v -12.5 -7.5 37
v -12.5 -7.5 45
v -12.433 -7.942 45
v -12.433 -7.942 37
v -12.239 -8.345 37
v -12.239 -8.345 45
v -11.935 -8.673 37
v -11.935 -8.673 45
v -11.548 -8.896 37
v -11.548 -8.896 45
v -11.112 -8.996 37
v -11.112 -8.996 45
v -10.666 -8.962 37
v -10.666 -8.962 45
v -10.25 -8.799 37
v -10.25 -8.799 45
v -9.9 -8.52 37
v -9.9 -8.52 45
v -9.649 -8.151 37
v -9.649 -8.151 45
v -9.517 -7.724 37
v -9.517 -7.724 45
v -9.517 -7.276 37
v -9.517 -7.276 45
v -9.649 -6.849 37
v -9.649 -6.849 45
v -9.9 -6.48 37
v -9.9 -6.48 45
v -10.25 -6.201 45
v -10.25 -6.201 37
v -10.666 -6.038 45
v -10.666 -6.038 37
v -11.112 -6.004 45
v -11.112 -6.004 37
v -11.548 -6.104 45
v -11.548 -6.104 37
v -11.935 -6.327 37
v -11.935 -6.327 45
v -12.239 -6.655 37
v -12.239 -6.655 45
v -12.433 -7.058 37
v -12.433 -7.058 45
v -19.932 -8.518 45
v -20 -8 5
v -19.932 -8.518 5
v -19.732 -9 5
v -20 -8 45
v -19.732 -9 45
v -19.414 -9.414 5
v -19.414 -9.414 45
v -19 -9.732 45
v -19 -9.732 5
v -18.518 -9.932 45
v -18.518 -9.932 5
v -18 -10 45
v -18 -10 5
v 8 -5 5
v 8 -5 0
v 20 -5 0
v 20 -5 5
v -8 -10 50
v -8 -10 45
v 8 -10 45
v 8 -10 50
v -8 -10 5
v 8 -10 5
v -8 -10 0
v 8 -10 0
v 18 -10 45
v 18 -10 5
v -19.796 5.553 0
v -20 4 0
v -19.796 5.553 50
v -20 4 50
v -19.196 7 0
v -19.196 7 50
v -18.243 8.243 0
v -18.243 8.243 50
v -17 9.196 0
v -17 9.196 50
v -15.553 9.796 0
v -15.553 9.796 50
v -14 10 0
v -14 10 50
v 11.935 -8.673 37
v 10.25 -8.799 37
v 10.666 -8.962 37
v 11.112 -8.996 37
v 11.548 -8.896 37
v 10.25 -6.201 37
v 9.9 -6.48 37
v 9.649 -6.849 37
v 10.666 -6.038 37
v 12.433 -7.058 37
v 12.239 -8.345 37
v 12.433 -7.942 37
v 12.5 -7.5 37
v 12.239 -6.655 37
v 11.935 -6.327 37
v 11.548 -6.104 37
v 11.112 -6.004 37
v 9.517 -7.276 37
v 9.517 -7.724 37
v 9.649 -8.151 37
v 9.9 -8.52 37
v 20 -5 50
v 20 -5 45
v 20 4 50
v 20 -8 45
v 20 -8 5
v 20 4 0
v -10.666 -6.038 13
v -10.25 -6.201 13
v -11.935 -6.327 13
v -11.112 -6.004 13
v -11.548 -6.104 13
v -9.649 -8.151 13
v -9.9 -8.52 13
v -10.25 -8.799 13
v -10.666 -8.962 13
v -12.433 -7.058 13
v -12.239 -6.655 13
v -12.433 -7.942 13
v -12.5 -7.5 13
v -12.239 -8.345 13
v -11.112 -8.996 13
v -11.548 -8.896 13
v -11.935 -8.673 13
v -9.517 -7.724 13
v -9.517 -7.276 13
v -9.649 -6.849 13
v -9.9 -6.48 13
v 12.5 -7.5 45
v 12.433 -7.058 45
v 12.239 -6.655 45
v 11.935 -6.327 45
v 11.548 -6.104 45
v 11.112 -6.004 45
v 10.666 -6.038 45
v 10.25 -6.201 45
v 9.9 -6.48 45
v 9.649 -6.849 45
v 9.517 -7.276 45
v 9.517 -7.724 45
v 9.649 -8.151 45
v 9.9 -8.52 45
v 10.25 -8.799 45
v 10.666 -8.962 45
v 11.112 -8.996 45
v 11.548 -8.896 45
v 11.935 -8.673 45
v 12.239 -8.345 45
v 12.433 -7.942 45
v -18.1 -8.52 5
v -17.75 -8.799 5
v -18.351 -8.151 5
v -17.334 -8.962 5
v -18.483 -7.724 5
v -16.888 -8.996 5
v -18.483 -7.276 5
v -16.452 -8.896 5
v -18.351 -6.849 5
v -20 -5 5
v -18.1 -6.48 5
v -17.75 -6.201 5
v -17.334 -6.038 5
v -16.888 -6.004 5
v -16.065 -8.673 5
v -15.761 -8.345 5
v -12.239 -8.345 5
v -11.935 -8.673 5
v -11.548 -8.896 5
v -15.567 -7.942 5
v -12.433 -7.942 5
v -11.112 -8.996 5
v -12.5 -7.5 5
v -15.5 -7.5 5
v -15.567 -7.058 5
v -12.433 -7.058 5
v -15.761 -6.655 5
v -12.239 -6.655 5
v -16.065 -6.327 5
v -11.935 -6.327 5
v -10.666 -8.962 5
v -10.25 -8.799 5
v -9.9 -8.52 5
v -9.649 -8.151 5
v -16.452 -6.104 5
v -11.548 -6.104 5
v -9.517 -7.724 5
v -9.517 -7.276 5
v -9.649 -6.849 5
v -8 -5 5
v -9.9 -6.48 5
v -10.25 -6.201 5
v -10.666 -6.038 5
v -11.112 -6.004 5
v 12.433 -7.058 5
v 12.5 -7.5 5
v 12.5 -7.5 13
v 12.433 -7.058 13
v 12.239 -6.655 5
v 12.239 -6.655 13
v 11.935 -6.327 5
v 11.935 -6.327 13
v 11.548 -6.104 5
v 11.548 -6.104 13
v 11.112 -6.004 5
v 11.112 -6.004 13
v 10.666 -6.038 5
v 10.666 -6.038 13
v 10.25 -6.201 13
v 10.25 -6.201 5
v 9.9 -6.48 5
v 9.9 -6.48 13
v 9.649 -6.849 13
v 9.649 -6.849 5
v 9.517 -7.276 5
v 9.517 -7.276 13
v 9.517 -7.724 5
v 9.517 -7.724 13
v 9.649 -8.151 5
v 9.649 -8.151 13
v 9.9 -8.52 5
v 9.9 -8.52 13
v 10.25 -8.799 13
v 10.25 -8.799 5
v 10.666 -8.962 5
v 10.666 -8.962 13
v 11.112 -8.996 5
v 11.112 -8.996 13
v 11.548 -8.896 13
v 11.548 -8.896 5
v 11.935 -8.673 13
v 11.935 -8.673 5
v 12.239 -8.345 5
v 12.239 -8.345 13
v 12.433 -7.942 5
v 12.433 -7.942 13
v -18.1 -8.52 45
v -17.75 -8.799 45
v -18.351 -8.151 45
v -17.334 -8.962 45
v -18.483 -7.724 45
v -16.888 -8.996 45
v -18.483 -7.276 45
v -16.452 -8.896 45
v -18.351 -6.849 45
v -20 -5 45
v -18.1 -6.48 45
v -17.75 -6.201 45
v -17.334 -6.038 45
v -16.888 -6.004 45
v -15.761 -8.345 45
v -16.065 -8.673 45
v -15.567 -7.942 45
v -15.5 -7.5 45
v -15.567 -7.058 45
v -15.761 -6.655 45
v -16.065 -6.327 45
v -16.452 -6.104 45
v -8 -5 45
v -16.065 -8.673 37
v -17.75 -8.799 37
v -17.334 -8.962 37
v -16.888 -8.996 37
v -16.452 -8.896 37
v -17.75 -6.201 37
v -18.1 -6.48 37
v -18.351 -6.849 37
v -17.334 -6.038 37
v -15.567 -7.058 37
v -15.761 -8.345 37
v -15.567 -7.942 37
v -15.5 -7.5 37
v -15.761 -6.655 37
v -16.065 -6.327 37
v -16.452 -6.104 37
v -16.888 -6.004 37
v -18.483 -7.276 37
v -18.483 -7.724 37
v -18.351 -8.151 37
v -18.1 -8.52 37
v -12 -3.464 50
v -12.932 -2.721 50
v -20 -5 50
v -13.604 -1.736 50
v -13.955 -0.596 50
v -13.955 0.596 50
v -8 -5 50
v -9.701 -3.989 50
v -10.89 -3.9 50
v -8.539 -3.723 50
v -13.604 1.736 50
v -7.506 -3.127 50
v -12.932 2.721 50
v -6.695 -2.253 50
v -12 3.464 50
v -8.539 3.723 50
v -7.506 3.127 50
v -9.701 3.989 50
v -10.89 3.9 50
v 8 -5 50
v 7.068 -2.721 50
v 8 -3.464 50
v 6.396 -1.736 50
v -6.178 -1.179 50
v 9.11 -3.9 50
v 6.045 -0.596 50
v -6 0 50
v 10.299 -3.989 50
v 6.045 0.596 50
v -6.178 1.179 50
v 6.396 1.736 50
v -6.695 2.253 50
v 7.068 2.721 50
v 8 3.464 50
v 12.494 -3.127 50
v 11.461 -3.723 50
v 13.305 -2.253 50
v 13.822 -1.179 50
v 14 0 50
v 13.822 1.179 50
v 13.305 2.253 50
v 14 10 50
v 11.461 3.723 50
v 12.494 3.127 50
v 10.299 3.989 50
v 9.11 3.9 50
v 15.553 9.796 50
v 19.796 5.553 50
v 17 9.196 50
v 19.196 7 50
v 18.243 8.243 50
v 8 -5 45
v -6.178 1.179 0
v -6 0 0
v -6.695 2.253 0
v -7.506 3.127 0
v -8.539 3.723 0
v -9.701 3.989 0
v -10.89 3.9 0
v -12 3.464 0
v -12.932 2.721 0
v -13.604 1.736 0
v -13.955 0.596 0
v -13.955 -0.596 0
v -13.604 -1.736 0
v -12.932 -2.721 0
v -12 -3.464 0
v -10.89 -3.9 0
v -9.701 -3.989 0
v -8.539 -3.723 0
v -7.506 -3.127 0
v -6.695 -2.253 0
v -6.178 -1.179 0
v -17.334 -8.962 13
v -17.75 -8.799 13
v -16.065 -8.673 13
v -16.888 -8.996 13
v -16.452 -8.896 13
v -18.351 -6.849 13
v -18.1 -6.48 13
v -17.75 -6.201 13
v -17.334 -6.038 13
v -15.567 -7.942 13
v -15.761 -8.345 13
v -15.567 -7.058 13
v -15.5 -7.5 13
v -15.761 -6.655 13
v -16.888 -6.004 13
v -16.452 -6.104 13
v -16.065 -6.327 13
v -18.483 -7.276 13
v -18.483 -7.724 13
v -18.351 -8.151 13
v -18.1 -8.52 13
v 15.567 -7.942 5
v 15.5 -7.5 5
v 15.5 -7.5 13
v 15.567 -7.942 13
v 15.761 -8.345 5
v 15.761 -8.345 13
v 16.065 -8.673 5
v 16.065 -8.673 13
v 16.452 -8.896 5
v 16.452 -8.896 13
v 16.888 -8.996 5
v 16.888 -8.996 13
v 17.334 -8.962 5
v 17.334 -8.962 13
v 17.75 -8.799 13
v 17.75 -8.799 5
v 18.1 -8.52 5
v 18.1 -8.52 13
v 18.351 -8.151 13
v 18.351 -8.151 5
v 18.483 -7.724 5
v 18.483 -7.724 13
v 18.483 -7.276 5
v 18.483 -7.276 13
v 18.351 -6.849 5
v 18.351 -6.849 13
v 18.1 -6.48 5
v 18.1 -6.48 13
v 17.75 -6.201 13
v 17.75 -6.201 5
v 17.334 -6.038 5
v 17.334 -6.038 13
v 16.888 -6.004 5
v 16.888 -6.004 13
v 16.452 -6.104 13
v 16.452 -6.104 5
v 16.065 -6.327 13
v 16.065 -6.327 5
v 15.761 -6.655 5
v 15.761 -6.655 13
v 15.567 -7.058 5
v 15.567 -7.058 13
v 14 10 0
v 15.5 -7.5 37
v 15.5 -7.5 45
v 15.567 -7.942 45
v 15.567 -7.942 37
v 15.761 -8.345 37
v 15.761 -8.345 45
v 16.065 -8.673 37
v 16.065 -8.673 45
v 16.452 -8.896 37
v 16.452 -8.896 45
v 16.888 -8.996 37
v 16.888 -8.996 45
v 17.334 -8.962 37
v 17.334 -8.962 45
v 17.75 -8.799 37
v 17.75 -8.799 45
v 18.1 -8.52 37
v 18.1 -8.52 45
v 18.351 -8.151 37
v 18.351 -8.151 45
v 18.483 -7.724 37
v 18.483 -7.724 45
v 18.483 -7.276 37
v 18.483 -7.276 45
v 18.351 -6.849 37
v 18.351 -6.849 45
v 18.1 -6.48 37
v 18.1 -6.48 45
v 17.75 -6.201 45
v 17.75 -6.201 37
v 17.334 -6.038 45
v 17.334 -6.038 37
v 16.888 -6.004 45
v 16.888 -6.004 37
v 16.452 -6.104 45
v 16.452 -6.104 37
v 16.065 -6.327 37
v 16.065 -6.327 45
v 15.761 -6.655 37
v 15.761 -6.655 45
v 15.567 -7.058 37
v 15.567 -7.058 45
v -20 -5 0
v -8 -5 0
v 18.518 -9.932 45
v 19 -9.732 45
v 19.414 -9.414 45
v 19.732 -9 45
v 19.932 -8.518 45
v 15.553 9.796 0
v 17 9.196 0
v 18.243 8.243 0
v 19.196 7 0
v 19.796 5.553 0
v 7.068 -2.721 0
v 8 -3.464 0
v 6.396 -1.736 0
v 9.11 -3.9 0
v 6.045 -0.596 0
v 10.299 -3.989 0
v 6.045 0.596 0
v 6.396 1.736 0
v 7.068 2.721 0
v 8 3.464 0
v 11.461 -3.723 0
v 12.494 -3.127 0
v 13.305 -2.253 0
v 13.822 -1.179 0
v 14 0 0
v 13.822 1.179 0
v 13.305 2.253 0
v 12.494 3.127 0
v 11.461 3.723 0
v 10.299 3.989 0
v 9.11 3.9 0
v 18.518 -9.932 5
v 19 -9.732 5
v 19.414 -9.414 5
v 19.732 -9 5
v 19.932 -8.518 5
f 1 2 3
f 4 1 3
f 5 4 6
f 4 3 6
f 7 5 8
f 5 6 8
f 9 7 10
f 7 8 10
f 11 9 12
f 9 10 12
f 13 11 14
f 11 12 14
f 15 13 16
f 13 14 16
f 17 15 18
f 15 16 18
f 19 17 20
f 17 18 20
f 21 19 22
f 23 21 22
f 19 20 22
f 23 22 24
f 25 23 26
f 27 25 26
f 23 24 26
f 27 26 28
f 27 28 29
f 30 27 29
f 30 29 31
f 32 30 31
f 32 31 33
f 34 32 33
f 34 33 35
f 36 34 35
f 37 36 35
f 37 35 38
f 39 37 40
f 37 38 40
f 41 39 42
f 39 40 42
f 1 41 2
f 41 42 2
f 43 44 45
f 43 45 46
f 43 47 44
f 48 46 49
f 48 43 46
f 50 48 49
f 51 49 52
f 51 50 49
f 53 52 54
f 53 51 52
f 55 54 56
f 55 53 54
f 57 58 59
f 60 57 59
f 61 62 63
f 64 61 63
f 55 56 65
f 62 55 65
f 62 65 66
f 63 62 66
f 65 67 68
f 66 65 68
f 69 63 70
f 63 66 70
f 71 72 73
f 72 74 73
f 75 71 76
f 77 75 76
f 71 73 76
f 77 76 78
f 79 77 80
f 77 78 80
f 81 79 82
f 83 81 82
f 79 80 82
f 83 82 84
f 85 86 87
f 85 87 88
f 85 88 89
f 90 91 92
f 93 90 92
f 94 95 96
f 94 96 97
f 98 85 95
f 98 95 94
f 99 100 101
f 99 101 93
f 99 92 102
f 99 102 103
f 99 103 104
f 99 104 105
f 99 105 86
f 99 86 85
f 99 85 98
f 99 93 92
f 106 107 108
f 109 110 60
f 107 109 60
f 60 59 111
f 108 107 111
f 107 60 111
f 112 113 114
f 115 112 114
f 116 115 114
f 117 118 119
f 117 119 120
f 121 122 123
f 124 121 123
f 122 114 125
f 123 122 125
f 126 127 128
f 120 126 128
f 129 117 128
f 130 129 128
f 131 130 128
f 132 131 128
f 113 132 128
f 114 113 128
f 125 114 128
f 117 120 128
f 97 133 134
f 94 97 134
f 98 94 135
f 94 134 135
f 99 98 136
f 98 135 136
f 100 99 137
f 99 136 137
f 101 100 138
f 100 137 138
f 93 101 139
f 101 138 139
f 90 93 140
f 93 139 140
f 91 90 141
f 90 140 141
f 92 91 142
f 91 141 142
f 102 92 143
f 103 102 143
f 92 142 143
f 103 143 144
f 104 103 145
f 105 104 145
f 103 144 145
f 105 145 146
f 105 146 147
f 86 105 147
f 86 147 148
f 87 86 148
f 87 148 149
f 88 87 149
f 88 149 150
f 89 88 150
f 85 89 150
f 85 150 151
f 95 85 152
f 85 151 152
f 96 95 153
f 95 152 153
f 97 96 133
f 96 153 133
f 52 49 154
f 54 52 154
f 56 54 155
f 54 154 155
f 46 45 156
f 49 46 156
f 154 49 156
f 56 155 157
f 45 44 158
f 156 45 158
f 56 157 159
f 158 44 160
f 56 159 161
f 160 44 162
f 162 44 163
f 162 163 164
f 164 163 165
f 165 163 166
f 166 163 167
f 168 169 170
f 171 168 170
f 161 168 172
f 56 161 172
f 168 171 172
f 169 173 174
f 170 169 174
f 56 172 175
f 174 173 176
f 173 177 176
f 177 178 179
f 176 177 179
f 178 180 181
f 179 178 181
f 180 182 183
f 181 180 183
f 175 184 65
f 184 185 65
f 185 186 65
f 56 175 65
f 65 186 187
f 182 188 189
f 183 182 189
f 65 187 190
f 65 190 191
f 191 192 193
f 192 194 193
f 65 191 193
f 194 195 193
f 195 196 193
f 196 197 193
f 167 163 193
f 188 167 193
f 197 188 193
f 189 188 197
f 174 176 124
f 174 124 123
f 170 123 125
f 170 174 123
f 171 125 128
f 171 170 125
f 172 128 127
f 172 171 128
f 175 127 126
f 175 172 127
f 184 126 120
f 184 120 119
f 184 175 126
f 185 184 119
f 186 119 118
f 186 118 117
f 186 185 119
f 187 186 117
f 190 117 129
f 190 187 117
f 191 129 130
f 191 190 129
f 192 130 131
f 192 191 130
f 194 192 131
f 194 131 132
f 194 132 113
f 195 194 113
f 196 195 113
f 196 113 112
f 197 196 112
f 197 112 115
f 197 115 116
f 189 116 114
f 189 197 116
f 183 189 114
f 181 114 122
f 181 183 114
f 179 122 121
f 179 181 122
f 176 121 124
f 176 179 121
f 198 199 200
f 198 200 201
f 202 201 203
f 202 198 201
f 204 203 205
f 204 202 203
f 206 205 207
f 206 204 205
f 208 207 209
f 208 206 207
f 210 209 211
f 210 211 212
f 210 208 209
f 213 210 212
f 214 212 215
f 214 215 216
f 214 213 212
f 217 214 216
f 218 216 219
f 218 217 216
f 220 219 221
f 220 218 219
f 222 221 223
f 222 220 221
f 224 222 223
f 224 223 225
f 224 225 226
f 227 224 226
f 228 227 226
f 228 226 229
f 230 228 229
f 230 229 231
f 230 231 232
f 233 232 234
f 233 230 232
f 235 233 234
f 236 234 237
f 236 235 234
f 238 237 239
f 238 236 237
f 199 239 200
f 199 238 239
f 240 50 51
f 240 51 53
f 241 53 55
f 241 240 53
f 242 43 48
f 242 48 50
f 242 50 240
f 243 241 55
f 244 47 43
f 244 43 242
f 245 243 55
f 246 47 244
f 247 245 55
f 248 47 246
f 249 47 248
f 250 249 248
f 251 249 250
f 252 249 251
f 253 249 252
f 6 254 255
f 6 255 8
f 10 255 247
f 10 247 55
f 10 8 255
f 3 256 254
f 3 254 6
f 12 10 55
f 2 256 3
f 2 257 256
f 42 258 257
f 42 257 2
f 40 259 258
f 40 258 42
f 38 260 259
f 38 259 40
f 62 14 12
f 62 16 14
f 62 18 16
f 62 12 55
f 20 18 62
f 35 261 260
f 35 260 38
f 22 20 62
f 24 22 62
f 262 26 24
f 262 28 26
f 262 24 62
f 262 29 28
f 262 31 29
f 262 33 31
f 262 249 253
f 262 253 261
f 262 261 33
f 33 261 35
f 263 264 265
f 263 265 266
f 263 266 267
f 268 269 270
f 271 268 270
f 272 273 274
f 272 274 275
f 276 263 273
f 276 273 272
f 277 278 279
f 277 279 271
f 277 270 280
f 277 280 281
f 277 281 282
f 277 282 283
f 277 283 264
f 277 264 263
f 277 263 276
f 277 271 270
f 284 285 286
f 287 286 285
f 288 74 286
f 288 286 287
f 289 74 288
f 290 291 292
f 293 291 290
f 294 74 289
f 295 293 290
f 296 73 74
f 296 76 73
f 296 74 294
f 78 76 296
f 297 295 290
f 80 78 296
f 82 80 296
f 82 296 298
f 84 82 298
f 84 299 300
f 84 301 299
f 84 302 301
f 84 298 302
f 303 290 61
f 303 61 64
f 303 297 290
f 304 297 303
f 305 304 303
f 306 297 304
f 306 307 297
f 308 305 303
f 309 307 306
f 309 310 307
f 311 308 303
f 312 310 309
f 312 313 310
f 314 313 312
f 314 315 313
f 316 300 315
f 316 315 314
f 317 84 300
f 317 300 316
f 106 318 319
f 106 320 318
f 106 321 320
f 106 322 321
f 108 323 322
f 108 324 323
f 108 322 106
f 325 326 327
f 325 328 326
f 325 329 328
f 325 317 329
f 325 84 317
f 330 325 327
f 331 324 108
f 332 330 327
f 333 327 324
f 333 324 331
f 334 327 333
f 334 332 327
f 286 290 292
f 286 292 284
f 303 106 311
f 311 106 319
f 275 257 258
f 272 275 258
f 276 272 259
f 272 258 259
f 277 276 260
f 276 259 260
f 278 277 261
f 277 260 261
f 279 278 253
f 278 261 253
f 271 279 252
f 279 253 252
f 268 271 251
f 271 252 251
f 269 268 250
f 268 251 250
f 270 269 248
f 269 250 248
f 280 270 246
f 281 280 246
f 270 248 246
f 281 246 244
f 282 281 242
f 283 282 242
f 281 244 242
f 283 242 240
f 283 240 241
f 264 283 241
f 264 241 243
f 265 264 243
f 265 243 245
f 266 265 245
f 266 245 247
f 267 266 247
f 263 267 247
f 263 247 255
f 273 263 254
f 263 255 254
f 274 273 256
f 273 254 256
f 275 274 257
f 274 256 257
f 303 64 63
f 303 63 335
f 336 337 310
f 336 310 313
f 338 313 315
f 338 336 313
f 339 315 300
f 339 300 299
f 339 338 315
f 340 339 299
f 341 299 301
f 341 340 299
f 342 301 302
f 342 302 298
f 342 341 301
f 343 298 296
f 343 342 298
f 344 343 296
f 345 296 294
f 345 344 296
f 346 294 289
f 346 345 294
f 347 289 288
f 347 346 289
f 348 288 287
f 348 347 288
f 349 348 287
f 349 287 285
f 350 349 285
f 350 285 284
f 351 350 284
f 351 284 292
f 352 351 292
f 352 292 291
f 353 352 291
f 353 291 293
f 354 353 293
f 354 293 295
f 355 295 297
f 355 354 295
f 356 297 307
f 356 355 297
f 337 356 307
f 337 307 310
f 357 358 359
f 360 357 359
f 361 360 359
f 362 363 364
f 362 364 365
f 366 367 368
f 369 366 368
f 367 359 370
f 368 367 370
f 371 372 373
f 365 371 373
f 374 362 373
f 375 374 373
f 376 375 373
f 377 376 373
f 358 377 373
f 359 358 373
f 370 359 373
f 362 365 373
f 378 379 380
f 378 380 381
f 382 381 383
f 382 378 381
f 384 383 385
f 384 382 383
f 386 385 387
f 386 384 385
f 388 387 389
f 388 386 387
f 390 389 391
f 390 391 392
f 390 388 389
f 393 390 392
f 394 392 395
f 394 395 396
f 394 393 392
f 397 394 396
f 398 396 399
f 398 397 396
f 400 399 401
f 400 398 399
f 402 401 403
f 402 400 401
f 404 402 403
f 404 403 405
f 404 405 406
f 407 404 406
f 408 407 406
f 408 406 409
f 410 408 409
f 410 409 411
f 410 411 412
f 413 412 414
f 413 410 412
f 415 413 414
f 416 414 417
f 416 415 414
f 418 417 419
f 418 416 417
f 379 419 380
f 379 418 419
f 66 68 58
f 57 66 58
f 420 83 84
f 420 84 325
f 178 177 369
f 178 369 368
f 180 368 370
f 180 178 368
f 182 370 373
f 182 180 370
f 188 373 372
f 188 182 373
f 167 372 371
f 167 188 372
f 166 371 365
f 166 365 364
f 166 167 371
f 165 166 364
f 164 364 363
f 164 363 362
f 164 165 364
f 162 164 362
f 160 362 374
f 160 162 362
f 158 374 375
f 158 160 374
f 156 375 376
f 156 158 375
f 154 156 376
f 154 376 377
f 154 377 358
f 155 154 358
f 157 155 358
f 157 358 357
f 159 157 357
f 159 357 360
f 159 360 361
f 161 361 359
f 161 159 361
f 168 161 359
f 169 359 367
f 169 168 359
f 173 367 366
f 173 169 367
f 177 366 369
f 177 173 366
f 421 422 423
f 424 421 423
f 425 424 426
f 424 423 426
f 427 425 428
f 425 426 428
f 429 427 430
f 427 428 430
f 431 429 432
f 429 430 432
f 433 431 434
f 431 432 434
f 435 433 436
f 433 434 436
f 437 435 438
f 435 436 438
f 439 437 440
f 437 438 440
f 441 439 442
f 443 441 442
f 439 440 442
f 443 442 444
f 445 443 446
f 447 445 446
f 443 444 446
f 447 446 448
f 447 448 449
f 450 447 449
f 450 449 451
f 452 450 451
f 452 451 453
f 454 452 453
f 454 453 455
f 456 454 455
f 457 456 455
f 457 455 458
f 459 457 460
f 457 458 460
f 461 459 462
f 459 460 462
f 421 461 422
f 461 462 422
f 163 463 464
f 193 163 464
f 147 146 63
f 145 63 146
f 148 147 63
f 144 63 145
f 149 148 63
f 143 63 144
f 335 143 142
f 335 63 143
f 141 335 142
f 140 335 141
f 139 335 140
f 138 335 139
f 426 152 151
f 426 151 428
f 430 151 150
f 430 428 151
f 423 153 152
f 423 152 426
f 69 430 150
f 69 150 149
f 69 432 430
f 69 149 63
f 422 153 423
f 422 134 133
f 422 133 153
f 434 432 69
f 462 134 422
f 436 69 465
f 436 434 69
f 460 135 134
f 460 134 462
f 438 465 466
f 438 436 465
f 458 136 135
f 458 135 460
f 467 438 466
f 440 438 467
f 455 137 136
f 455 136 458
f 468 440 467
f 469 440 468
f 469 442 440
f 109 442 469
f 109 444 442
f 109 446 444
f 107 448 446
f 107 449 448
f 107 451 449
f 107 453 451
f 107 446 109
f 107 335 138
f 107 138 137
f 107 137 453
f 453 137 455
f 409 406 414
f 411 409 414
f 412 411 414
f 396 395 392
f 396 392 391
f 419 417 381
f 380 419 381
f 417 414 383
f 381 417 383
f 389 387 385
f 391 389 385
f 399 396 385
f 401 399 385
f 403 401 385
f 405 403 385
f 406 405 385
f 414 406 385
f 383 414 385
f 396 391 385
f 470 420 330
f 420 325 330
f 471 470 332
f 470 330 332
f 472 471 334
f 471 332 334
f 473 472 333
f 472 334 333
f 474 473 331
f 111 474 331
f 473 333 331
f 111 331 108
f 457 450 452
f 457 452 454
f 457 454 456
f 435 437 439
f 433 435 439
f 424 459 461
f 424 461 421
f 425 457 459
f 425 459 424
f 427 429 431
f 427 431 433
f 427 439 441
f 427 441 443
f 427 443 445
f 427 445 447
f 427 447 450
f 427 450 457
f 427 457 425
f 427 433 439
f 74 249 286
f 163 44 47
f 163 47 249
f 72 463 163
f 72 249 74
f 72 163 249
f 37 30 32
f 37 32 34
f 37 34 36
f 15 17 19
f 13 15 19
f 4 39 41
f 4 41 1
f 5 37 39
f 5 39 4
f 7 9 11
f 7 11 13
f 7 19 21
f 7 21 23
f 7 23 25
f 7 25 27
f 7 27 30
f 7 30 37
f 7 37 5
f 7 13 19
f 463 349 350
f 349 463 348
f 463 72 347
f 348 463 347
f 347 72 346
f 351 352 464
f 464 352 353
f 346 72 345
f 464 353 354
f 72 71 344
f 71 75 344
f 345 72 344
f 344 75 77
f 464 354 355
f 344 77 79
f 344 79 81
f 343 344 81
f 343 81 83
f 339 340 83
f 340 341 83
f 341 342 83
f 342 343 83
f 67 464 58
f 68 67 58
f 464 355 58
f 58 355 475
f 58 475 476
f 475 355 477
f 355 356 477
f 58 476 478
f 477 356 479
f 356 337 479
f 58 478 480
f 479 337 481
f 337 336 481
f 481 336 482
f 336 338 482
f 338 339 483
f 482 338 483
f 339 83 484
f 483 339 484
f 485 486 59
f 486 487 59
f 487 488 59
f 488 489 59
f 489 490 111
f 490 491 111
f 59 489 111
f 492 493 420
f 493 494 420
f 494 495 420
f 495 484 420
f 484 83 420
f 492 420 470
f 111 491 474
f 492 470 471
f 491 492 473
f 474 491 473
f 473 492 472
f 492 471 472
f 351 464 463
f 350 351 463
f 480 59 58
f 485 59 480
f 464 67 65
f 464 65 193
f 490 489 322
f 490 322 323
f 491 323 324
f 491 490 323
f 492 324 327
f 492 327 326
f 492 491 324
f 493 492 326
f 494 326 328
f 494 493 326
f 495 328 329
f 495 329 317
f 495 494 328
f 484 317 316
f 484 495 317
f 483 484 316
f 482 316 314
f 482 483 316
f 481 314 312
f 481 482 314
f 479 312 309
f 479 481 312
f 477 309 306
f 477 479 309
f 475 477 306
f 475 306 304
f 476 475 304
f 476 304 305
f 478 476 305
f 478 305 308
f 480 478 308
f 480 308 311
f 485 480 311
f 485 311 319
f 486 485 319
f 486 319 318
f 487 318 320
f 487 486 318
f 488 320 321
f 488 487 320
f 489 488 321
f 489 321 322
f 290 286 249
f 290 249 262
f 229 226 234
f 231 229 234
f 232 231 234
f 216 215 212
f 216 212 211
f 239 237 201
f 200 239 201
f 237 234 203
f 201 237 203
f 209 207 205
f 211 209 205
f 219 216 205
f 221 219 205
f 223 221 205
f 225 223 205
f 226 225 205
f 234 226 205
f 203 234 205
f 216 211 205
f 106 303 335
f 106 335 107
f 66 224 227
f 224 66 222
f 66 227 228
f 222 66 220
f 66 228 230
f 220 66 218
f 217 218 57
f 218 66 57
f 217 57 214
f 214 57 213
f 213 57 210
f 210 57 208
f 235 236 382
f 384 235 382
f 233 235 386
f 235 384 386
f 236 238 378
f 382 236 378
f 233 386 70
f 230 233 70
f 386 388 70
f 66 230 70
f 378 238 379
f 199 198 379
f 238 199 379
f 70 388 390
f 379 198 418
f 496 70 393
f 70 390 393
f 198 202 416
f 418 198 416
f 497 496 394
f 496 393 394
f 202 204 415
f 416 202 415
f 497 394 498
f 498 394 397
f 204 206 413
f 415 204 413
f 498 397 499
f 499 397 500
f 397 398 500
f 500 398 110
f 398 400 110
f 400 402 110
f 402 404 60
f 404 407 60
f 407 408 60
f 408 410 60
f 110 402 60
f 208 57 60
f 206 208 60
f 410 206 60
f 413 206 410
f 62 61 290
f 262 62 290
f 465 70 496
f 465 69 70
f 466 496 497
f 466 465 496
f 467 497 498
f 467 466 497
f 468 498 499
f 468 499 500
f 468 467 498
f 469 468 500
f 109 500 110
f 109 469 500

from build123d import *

# Parameters (mm, degrees)
ESQUISSE1_W             = 40
ESQUISSE1_H             = 20
ESQUISSE1_R             = 4
BOSS_EXTRU_1_DEPTH      = 50
ESQUISSE2_W             = 12
ESQUISSE2_H             = 5
ENL_V_MAT_EXTRU_1_DEPTH = 5
ESQUISSE3_R             = 1.5
ENL_V_MAT_EXTRU_2_DEPTH = 8
CONG_2_R                = 6
CONG_3_R                = 2


with BuildPart() as part:
    # Esquisse1 → Boss.-Extru.1 (new body)
    with BuildSketch(Plane.XY):
        Rectangle(ESQUISSE1_W, ESQUISSE1_H)
        with Locations((-10, 0)):
            Circle(ESQUISSE1_R, mode=Mode.SUBTRACT)
        with Locations((10, 0)):
            Circle(ESQUISSE1_R, mode=Mode.SUBTRACT)
    extrude(amount=BOSS_EXTRU_1_DEPTH)

    # Esquisse2 → Enlèv. mat.-Extru.1 (cut)
    with BuildSketch(Plane.XY.offset(50)):
        with Locations((-14, -7.5)):
            Rectangle(ESQUISSE2_W, ESQUISSE2_H)
        with Locations((14, -7.5)):
            Rectangle(ESQUISSE2_W, ESQUISSE2_H)
    enl_v_mat_extru_1 = extrude(amount=-ENL_V_MAT_EXTRU_1_DEPTH, mode=Mode.SUBTRACT)

    # Esquisse3 → Enlèv. mat.-Extru.2 (cut)
    with BuildSketch(Plane.XY.offset(45)):
        with Locations((-17, -7.5)):
            Circle(ESQUISSE3_R)
        with Locations(Location((-11, -7.5, 0), (0, 0, 180))):
            Circle(ESQUISSE3_R)
        with Locations(Location((17, -7.5, 0), (0, 0, 180))):
            Circle(ESQUISSE3_R)
        with Locations((11, -7.5)):
            Circle(ESQUISSE3_R)
    enl_v_mat_extru_2 = extrude(amount=-ENL_V_MAT_EXTRU_2_DEPTH, mode=Mode.SUBTRACT)

    # Symétrie1: Enlèv. mat.-Extru.1, Enlèv. mat.-Extru.2 across plane
    add(enl_v_mat_extru_1.mirror(Plane.XY.offset(25)), mode=Mode.SUBTRACT)
    add(enl_v_mat_extru_2.mirror(Plane.XY.offset(25)), mode=Mode.SUBTRACT)

    # Congé2
    cong_2_edges = [part.edges().sort_by_distance(p)[0] for p in [
        (-20, 10, 25),
        (20, 10, 25),
    ]]
    fillet(cong_2_edges, radius=CONG_2_R)

    # Congé3
    cong_3_edges = [part.edges().sort_by_distance(p)[0] for p in [
        (20, -10, 25),
        (-20, -10, 25),
    ]]
    fillet(cong_3_edges, radius=CONG_3_R)


solid = part.part
